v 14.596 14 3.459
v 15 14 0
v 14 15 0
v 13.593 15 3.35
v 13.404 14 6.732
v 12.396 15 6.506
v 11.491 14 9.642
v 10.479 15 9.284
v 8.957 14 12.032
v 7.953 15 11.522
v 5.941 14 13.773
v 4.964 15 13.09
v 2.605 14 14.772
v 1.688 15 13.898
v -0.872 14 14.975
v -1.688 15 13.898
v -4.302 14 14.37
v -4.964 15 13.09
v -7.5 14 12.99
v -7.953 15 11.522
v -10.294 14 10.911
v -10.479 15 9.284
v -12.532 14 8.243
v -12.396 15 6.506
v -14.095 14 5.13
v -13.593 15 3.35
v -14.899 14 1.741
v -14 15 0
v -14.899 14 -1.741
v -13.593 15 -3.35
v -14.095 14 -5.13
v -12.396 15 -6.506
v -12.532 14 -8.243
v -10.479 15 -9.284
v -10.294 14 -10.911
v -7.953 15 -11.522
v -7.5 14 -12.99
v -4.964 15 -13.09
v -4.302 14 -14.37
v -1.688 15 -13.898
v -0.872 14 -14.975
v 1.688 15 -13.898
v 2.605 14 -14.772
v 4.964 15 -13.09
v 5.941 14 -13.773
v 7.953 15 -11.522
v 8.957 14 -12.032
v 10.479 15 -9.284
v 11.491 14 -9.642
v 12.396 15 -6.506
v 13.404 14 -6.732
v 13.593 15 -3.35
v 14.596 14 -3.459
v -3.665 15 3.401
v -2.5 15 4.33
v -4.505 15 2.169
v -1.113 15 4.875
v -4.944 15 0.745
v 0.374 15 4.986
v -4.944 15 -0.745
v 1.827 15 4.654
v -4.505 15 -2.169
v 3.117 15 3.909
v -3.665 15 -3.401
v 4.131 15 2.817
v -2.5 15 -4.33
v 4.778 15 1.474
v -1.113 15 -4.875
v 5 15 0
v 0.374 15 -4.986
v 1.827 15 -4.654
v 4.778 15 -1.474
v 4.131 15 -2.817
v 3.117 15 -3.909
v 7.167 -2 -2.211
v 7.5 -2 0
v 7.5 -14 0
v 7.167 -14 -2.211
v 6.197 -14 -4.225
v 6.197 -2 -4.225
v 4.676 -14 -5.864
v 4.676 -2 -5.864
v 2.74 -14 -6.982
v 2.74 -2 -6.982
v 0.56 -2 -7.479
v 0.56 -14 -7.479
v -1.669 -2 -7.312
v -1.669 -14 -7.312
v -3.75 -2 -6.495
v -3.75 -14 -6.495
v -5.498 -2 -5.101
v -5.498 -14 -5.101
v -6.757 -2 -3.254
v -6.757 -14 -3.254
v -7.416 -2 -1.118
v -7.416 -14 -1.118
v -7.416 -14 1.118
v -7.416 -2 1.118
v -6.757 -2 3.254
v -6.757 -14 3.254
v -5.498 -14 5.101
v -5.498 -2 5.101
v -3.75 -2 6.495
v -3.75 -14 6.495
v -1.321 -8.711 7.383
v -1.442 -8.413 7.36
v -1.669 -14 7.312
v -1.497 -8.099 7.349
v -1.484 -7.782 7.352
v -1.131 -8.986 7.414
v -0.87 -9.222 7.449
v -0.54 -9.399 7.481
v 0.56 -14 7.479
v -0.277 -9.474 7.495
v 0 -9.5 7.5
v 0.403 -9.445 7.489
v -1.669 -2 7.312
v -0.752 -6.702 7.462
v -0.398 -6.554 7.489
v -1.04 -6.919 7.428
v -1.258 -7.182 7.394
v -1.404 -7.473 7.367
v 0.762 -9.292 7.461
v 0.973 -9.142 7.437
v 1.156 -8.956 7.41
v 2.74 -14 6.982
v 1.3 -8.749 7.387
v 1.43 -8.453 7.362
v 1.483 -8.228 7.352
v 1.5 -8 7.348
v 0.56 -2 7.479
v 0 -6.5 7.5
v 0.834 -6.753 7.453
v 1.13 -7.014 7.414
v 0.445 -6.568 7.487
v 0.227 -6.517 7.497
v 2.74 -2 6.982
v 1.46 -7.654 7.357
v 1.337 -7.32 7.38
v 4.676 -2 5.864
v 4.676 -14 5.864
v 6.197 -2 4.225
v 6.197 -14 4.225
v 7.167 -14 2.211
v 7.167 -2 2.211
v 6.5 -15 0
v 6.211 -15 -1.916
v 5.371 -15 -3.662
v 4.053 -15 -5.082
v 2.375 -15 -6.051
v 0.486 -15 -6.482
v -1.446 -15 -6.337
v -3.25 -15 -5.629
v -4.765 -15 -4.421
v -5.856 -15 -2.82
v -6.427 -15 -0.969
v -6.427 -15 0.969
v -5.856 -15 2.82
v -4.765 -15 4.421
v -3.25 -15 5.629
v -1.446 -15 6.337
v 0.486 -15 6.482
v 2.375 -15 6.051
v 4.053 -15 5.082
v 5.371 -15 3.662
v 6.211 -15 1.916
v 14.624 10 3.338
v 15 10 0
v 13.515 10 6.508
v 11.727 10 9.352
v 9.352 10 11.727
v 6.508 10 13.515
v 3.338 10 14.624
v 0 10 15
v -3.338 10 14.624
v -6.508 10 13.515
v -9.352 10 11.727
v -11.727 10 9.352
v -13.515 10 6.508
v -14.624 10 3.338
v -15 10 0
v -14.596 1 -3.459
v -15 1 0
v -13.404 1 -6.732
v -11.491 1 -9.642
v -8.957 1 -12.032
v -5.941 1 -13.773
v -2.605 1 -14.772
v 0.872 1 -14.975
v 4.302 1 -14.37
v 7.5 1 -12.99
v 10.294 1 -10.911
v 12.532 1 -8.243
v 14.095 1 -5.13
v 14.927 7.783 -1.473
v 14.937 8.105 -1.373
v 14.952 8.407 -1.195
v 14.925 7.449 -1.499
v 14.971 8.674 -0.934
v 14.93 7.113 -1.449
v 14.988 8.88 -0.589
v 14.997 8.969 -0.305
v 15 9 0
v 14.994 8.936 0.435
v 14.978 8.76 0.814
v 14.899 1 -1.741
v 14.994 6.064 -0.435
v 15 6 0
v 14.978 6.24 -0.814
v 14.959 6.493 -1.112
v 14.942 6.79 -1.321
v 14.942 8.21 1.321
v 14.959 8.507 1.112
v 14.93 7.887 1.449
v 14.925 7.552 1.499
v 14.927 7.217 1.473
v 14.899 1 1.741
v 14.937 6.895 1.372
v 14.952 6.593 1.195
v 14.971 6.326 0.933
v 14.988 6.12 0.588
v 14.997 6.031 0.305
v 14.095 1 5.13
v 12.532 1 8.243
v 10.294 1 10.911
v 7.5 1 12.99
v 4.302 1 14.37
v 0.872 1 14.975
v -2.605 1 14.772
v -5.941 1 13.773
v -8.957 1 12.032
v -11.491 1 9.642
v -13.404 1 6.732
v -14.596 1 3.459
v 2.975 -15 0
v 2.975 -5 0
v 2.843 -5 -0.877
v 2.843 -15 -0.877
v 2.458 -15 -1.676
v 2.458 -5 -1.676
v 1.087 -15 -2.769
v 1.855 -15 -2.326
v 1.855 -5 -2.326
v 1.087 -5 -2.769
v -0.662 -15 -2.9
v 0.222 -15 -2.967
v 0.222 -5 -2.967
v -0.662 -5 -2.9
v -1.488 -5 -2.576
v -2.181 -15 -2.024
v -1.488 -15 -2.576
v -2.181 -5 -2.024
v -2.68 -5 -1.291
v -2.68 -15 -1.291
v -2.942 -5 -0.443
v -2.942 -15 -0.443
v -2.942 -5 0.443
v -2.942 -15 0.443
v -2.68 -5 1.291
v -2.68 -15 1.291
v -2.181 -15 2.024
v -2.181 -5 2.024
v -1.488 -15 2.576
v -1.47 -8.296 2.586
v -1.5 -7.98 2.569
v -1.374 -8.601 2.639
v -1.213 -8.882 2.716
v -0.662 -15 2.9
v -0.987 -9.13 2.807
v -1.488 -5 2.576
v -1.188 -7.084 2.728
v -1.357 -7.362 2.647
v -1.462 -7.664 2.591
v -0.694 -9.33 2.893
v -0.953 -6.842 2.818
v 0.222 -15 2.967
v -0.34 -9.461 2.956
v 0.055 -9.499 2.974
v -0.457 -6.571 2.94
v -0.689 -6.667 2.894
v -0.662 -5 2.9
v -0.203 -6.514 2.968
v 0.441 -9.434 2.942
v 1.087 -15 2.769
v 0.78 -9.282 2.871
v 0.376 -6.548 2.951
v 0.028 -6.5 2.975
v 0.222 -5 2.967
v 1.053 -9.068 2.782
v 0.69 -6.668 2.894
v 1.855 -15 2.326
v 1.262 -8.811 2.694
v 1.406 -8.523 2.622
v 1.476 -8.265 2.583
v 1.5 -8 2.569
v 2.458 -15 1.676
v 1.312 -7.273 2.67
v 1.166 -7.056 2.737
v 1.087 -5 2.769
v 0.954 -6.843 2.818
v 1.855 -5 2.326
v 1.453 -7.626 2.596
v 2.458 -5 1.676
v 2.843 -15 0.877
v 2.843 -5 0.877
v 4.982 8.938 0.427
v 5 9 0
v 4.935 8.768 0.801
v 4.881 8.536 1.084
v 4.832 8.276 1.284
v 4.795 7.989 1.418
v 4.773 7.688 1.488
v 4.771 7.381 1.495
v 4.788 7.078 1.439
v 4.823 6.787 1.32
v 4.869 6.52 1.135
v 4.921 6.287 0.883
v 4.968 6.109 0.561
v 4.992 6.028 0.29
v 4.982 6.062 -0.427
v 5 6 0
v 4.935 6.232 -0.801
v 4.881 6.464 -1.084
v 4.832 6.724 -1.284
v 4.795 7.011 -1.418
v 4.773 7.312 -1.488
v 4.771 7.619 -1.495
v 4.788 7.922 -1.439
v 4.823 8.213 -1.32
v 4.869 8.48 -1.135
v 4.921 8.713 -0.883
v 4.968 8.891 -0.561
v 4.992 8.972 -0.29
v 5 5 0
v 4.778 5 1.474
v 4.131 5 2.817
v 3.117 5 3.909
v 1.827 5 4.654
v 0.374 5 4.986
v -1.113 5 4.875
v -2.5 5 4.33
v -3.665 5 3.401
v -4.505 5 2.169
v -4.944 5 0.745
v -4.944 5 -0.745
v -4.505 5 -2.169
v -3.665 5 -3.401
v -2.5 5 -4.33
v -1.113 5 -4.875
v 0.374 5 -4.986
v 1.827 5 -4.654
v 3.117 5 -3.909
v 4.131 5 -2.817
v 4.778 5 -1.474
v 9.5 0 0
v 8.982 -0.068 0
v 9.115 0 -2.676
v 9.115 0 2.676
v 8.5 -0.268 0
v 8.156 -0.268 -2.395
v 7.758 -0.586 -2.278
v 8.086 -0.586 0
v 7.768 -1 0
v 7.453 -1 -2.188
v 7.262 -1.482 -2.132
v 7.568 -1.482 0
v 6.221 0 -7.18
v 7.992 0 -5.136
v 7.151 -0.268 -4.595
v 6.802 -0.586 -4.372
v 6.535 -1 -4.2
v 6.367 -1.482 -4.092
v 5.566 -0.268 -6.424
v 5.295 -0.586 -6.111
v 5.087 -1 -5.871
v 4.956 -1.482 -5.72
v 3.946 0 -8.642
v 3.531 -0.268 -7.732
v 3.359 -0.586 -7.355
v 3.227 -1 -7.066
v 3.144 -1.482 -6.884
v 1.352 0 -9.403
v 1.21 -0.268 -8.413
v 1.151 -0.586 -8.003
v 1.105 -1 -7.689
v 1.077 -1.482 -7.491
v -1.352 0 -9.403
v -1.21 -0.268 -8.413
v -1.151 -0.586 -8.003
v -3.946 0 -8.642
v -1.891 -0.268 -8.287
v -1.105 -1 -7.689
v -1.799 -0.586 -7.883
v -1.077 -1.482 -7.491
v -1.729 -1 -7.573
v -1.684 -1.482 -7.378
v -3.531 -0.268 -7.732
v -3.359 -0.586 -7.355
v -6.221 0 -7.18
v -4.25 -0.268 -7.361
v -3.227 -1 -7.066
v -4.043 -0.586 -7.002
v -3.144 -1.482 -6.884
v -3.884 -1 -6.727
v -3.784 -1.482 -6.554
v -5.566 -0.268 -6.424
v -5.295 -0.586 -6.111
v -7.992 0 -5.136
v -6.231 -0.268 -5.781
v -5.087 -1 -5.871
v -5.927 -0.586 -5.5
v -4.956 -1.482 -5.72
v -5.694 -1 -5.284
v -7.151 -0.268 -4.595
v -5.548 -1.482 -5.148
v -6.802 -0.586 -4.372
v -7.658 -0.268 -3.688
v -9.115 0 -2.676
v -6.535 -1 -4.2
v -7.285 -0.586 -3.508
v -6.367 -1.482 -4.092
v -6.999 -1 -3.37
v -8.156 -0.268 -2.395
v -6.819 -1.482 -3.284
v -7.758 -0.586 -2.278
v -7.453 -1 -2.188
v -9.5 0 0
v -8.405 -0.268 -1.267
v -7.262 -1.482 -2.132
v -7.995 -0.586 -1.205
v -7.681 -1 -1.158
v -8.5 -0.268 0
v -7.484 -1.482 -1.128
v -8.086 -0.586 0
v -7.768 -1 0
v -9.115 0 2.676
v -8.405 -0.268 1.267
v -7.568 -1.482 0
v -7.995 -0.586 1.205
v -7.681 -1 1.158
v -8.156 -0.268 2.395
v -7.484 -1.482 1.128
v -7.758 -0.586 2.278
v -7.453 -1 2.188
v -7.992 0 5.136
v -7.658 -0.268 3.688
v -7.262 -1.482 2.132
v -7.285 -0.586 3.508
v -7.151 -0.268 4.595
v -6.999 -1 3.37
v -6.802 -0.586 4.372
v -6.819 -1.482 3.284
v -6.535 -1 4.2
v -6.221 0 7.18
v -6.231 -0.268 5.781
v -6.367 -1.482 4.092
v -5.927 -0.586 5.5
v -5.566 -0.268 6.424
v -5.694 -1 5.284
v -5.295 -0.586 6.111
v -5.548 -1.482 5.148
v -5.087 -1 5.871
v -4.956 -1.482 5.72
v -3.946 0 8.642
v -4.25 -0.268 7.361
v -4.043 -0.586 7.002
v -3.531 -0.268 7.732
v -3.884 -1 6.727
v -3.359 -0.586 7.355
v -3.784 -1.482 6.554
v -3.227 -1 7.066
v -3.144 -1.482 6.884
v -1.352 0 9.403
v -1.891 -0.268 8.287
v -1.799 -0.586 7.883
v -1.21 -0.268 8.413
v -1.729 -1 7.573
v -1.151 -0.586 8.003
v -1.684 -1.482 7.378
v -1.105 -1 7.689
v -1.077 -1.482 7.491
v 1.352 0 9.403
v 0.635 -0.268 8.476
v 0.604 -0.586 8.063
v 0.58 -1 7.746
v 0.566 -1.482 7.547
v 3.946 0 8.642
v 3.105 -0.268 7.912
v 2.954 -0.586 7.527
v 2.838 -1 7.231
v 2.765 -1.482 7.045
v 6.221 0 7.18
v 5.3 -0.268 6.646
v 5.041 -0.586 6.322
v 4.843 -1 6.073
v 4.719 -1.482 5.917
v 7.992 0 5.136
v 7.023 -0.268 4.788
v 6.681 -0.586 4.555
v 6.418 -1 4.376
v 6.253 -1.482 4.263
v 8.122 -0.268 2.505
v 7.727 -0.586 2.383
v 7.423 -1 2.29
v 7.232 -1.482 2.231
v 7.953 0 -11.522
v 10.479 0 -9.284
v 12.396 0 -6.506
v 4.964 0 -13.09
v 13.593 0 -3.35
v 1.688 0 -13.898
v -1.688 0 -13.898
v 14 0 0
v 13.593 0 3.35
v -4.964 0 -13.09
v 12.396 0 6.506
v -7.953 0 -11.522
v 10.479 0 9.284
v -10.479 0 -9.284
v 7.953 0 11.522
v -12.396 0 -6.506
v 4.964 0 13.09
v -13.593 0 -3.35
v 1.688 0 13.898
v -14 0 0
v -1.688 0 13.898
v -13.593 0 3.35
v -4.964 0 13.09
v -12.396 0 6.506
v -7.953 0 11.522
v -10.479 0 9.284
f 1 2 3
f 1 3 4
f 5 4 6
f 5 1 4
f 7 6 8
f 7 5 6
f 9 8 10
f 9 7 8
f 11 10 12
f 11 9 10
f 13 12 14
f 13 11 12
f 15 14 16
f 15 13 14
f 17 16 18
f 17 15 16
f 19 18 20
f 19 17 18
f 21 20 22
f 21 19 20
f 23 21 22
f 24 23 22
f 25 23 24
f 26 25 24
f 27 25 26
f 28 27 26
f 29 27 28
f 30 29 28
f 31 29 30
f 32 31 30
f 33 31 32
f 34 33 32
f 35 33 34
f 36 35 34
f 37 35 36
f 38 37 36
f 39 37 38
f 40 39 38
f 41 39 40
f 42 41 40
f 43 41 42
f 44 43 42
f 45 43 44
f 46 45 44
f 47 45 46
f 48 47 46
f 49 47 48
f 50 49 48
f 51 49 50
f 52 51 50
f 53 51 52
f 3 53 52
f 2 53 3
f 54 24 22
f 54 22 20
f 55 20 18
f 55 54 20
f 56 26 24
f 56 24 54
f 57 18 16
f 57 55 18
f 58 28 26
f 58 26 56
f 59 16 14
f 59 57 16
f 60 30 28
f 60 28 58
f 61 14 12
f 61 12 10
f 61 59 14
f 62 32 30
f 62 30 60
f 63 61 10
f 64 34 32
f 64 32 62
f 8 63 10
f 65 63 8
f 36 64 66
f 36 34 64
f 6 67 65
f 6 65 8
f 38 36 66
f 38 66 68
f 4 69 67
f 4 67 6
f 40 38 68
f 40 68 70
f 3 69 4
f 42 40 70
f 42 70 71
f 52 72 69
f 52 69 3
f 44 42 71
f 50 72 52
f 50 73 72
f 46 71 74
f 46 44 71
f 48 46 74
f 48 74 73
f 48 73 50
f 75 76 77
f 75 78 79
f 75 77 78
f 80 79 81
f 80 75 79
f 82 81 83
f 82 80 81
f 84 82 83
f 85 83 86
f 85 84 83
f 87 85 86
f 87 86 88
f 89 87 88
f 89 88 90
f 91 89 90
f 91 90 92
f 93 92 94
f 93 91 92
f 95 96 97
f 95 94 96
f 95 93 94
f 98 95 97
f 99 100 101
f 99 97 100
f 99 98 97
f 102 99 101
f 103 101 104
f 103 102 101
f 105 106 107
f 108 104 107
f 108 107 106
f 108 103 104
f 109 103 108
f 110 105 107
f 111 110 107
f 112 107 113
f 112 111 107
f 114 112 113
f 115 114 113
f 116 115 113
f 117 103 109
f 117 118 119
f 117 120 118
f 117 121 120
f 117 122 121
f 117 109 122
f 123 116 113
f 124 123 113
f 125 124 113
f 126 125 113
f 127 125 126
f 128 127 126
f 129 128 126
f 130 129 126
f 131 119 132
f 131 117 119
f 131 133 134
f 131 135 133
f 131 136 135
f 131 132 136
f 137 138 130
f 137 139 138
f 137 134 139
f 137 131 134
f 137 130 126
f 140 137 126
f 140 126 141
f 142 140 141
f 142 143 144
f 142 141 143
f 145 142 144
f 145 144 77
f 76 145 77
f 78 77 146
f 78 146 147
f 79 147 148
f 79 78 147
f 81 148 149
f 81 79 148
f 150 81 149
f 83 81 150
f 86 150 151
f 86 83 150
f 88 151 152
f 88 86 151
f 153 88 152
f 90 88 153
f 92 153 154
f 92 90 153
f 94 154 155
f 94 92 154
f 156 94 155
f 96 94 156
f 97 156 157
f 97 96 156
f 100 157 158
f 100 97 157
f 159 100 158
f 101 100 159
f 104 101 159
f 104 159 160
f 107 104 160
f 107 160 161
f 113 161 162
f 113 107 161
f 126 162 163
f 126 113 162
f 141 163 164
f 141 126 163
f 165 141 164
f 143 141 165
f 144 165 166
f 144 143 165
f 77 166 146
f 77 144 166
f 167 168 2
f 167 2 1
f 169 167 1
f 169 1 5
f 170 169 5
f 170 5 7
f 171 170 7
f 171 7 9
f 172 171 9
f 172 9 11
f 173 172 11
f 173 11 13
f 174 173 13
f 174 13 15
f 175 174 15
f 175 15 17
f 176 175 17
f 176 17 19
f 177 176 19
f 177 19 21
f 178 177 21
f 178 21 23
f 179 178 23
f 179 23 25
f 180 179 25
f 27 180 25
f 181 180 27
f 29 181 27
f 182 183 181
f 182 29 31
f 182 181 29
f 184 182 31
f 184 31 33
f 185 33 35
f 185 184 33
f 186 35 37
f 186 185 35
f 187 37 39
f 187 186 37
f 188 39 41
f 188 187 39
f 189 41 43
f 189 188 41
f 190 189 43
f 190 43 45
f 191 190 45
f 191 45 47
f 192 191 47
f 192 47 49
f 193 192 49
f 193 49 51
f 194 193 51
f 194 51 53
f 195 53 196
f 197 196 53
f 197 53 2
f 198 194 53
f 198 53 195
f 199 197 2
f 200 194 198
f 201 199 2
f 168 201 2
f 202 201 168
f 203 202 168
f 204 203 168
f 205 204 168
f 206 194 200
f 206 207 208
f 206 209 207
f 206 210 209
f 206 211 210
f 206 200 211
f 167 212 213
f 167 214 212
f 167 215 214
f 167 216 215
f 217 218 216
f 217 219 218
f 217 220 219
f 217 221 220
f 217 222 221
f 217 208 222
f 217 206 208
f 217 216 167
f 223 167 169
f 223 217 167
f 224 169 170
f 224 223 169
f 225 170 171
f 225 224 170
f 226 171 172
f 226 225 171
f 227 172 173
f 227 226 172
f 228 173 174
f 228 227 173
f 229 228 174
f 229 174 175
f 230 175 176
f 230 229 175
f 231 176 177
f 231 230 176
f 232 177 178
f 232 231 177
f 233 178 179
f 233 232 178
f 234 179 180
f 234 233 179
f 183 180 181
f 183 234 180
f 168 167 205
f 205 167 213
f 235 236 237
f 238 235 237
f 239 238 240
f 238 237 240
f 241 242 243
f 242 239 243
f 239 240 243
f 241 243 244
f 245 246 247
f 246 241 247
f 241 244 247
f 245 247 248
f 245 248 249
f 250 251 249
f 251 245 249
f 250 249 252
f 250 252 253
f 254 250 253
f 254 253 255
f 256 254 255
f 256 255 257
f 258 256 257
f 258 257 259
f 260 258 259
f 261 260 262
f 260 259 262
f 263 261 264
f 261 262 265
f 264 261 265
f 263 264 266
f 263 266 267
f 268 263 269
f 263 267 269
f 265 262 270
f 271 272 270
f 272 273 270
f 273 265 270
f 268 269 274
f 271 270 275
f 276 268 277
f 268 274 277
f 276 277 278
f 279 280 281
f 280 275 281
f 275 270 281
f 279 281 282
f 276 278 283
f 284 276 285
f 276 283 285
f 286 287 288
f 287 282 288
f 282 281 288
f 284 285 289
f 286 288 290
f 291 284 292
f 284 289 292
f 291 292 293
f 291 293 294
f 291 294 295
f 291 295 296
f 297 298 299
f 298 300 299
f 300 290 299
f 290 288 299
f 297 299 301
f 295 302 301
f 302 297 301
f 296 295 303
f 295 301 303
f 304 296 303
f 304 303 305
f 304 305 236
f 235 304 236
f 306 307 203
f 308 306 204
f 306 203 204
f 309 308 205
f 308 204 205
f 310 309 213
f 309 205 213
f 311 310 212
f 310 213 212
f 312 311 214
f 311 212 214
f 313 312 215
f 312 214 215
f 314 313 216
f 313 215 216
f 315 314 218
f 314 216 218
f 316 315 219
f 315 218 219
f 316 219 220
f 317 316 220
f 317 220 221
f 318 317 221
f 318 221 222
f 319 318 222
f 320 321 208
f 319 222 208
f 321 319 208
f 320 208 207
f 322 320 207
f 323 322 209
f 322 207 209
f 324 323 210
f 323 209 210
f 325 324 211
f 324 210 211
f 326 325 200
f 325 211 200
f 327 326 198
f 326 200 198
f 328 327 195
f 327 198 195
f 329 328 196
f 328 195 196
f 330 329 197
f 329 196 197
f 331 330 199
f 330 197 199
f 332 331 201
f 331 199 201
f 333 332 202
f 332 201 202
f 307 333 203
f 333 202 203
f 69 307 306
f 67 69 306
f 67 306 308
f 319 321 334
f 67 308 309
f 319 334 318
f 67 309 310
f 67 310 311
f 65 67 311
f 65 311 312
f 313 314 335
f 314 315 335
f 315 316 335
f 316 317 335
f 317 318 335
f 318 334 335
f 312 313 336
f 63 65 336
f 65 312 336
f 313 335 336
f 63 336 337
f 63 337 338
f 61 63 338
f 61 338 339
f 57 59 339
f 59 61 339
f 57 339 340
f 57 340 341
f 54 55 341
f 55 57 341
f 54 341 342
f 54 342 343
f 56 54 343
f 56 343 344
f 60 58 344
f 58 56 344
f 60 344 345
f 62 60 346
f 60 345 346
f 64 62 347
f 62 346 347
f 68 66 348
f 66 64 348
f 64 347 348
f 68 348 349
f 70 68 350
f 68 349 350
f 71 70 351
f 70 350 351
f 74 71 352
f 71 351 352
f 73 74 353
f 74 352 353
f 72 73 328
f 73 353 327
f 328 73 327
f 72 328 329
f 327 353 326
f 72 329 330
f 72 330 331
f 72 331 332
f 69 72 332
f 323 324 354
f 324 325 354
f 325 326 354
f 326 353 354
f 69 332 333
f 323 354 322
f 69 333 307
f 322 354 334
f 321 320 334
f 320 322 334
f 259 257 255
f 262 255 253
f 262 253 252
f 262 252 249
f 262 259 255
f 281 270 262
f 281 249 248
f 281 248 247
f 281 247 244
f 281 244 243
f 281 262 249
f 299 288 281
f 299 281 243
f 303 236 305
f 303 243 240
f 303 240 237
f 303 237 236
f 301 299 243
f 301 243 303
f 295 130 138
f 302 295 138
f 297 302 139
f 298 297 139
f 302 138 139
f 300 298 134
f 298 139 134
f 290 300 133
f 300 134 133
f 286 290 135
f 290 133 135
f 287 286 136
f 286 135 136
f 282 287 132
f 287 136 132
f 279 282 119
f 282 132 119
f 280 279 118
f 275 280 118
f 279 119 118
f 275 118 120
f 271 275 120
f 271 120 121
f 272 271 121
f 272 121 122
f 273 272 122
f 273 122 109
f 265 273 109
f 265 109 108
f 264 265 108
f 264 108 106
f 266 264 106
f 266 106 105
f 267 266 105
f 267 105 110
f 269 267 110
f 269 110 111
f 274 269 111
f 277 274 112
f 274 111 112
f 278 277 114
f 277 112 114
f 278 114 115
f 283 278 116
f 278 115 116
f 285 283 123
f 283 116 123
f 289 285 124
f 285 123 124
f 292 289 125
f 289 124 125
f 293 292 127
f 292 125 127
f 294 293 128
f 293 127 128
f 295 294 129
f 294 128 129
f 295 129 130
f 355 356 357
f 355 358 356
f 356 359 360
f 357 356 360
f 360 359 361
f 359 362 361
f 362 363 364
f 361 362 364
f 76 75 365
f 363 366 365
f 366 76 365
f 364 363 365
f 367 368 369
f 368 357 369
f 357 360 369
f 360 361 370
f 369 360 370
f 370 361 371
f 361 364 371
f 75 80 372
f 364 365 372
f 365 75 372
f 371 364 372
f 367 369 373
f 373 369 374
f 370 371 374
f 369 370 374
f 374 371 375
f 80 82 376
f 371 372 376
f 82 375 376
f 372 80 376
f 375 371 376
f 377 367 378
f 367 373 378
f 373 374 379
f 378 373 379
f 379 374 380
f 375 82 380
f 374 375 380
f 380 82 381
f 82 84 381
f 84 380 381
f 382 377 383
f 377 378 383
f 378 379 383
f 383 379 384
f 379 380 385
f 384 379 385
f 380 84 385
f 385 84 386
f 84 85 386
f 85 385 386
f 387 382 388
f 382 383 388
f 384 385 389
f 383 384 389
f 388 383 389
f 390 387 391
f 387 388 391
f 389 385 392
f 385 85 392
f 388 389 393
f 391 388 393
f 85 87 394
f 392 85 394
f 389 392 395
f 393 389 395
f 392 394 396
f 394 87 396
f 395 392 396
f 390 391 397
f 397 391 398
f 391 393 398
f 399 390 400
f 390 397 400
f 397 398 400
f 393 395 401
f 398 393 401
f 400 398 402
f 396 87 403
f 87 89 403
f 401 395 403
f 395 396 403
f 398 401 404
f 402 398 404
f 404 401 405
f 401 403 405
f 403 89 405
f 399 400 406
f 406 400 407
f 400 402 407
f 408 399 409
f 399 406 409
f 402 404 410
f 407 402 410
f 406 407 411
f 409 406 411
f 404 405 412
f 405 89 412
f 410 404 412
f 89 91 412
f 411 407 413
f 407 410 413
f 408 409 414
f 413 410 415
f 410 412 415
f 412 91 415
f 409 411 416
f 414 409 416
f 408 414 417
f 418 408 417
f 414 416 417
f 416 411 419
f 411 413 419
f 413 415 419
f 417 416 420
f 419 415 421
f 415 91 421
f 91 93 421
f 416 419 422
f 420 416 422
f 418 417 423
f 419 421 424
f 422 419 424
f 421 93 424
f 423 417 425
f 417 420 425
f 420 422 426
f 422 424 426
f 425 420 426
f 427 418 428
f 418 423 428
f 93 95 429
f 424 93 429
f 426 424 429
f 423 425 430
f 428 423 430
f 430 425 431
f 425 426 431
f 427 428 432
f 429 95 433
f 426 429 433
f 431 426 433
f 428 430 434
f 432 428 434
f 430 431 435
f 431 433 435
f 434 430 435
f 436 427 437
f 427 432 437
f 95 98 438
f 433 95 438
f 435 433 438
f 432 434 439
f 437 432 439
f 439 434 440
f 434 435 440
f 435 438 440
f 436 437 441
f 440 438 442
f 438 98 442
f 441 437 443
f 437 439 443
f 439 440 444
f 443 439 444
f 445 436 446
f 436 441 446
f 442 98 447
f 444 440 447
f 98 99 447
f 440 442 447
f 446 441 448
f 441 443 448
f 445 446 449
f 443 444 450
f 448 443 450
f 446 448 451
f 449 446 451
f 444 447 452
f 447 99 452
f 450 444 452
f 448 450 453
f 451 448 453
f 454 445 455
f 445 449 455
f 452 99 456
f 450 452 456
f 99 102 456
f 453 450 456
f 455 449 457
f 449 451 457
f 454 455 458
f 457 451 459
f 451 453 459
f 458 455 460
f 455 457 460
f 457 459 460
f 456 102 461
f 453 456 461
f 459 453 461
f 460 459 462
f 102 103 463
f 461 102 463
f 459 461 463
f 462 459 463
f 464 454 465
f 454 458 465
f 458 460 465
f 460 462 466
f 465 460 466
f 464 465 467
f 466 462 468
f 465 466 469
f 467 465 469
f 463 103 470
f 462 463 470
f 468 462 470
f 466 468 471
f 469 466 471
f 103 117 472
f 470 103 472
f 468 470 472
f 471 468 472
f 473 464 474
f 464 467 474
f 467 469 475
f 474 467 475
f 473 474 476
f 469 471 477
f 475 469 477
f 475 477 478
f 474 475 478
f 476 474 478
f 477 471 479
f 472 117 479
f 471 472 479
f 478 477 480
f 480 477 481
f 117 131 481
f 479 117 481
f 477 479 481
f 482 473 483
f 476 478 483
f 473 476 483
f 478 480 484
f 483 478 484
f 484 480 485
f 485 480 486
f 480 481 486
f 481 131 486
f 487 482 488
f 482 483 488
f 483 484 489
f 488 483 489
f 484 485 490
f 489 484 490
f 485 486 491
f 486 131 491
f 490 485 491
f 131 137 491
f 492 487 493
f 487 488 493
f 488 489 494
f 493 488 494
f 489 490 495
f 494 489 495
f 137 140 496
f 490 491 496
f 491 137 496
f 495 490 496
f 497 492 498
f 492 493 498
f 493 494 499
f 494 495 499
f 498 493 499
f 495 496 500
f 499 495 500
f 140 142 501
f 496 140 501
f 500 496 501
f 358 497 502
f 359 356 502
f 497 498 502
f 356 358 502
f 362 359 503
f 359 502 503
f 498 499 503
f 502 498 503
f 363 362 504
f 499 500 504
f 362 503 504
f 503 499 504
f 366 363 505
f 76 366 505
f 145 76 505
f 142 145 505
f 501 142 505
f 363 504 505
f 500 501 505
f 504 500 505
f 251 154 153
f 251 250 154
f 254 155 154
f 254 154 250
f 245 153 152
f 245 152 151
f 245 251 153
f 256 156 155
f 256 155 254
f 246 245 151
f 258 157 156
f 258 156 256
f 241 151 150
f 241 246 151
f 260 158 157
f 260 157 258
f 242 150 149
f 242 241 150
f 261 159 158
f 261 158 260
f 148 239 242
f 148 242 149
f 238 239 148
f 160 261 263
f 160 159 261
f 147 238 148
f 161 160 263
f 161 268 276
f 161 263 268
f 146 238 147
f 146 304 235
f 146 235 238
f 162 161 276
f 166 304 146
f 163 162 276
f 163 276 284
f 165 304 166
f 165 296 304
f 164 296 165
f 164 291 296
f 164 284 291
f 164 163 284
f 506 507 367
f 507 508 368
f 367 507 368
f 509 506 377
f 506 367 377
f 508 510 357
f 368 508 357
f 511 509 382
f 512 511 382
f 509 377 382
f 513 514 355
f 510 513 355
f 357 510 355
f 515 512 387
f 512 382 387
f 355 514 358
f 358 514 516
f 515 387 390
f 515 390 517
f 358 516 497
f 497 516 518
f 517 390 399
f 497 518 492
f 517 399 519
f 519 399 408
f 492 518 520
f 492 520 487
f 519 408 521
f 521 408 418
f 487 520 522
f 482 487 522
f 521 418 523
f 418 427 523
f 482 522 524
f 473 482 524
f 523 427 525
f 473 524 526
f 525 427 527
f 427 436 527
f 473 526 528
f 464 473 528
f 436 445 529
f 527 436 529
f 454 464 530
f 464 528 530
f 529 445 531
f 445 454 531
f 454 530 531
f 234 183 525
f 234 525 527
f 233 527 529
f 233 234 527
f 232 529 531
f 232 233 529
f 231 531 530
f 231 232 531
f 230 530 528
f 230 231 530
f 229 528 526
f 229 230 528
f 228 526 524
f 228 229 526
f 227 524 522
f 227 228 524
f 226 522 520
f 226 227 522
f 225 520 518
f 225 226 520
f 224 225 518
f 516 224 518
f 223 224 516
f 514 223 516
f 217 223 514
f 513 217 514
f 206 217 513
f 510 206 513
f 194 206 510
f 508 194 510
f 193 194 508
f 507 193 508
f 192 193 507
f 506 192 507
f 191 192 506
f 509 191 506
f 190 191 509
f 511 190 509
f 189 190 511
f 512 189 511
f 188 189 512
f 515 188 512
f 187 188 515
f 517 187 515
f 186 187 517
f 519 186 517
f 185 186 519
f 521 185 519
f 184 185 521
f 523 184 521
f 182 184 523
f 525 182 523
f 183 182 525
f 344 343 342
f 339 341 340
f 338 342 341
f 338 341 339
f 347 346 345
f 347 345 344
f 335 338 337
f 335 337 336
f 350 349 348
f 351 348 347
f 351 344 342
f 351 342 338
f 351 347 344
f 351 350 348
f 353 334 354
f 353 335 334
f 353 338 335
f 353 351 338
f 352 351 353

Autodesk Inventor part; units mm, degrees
ref_plane "XZ Plane" through (0, 0, 0) normal (0, 1, 0) x (-1, 0, 0)
sketch "Boceto1" plane through (0, 0, 0) normal (0, 1, 0) x (-1, 0, 0)
  circle A0 centre (0, 0) radius 15
  dimension "d0" = 30
extrude "Extrusión1" add sketch "Boceto1" along normal blind 10
sketch "Boceto2" plane through (0, 10, 0) normal (0, 1, 0) x (1, 0, 0)
  circle A0 centre (0, 0) radius 5
  dimension "d3" = 10
extrude "Extrusión2" cut sketch "Boceto2" against normal blind 5
sketch "Boceto3" plane through (0, 0, 0) normal (0, -1, 0) x (1, 0, 0)
  circle A0 centre (0, 0) radius 7.5
  dimension "d6" = 15
extrude "Extrusión3" add sketch "Boceto3" along normal blind 10
sketch "Boceto4" plane through (0, -10, 0) normal (0, -1, 0) x (1, 0, 0)
  circle A0 centre (0, 0) radius 2.975
  dimension "d9" = 5.95
extrude "Extrusión4" cut sketch "Boceto4" against normal blind 5
sketch "Boceto5" plane through (0, 10, 0) normal (0, 1, 0) x (1, 0, 0)
  circle A0 centre (0, 0) radius 5 projected
  circle A1 centre (0, 0) radius 15 projected
extrude "Extrusión5" add sketch "Boceto5" along normal blind 5
sketch "Boceto6" plane through (0, -10, 0) normal (0, -1, 0) x (1, 0, 0)
  circle A0 centre (0, 0) radius 2.975 projected
  circle A1 centre (0, 0) radius 7.5 projected
extrude "Extrusión6" add sketch "Boceto6" along normal blind 5
chamfer "Chaflán1" distance 1 angle 45 1 edges at (-7.5, -15, 0)
chamfer "Chaflán2" distance 1 angle 45 1 edges at (15, 0, 0)
chamfer "Chaflán3" distance 1 angle 45 1 edges at (-15, 15, 0)
fillet "Empalme1" radius 2 1 edges at (-7.5, 0, 0)
ref_plane "Plano de trabajo1" through (15, 0, 0) normal (1, 0, 0) x (0, 1, 0)
sketch "Boceto7" plane through (15, 0, 0) normal (1, 0, 0) x (0, 1, 0)
  line L0 (1, 15) -> (1, -15) projected
  line L1 (14, -15) -> (14, 15) projected
  line L2 (1, -15) -> (14, -15) projected
  line L3 (1, 15) -> (14, 15) projected
  line L4 (7.5, 15) -> (7.5, -15) construction
  circle A0 centre (7.5, 0) radius 1.5
  point P0 (0, 0)
  dimension "d27" = 3
extrude "Extrusión7" cut sketch "Boceto7" against normal blind 11 contours A0
ref_plane "Plano de trabajo2" through (0, 0, 7.5) normal (0, 0, 1) x (1, 0, 0)
sketch "Boceto8" plane through (0, 0, 7.5) normal (0, 0, 1) x (1, 0, 0)
  line L0 (-7.5, -14) -> (7.5, -14) projected
  line L1 (7.5, -2) -> (-7.5, -2) projected
  line L2 (7.5, -2) -> (7.5, -14) projected
  line L3 (-7.5, -2) -> (-7.5, -14) projected
  line L4 (7.5, -8) -> (-7.5, -8) construction
  circle A0 centre (0, -8) radius 1.5
  point P0 (0, 0)
  dimension "d31" = 3
extrude "Extrusión8" cut sketch "Boceto8" against normal blind 6 contours A0
properties part number "Acople_EJE" material "Plástico ABS"
